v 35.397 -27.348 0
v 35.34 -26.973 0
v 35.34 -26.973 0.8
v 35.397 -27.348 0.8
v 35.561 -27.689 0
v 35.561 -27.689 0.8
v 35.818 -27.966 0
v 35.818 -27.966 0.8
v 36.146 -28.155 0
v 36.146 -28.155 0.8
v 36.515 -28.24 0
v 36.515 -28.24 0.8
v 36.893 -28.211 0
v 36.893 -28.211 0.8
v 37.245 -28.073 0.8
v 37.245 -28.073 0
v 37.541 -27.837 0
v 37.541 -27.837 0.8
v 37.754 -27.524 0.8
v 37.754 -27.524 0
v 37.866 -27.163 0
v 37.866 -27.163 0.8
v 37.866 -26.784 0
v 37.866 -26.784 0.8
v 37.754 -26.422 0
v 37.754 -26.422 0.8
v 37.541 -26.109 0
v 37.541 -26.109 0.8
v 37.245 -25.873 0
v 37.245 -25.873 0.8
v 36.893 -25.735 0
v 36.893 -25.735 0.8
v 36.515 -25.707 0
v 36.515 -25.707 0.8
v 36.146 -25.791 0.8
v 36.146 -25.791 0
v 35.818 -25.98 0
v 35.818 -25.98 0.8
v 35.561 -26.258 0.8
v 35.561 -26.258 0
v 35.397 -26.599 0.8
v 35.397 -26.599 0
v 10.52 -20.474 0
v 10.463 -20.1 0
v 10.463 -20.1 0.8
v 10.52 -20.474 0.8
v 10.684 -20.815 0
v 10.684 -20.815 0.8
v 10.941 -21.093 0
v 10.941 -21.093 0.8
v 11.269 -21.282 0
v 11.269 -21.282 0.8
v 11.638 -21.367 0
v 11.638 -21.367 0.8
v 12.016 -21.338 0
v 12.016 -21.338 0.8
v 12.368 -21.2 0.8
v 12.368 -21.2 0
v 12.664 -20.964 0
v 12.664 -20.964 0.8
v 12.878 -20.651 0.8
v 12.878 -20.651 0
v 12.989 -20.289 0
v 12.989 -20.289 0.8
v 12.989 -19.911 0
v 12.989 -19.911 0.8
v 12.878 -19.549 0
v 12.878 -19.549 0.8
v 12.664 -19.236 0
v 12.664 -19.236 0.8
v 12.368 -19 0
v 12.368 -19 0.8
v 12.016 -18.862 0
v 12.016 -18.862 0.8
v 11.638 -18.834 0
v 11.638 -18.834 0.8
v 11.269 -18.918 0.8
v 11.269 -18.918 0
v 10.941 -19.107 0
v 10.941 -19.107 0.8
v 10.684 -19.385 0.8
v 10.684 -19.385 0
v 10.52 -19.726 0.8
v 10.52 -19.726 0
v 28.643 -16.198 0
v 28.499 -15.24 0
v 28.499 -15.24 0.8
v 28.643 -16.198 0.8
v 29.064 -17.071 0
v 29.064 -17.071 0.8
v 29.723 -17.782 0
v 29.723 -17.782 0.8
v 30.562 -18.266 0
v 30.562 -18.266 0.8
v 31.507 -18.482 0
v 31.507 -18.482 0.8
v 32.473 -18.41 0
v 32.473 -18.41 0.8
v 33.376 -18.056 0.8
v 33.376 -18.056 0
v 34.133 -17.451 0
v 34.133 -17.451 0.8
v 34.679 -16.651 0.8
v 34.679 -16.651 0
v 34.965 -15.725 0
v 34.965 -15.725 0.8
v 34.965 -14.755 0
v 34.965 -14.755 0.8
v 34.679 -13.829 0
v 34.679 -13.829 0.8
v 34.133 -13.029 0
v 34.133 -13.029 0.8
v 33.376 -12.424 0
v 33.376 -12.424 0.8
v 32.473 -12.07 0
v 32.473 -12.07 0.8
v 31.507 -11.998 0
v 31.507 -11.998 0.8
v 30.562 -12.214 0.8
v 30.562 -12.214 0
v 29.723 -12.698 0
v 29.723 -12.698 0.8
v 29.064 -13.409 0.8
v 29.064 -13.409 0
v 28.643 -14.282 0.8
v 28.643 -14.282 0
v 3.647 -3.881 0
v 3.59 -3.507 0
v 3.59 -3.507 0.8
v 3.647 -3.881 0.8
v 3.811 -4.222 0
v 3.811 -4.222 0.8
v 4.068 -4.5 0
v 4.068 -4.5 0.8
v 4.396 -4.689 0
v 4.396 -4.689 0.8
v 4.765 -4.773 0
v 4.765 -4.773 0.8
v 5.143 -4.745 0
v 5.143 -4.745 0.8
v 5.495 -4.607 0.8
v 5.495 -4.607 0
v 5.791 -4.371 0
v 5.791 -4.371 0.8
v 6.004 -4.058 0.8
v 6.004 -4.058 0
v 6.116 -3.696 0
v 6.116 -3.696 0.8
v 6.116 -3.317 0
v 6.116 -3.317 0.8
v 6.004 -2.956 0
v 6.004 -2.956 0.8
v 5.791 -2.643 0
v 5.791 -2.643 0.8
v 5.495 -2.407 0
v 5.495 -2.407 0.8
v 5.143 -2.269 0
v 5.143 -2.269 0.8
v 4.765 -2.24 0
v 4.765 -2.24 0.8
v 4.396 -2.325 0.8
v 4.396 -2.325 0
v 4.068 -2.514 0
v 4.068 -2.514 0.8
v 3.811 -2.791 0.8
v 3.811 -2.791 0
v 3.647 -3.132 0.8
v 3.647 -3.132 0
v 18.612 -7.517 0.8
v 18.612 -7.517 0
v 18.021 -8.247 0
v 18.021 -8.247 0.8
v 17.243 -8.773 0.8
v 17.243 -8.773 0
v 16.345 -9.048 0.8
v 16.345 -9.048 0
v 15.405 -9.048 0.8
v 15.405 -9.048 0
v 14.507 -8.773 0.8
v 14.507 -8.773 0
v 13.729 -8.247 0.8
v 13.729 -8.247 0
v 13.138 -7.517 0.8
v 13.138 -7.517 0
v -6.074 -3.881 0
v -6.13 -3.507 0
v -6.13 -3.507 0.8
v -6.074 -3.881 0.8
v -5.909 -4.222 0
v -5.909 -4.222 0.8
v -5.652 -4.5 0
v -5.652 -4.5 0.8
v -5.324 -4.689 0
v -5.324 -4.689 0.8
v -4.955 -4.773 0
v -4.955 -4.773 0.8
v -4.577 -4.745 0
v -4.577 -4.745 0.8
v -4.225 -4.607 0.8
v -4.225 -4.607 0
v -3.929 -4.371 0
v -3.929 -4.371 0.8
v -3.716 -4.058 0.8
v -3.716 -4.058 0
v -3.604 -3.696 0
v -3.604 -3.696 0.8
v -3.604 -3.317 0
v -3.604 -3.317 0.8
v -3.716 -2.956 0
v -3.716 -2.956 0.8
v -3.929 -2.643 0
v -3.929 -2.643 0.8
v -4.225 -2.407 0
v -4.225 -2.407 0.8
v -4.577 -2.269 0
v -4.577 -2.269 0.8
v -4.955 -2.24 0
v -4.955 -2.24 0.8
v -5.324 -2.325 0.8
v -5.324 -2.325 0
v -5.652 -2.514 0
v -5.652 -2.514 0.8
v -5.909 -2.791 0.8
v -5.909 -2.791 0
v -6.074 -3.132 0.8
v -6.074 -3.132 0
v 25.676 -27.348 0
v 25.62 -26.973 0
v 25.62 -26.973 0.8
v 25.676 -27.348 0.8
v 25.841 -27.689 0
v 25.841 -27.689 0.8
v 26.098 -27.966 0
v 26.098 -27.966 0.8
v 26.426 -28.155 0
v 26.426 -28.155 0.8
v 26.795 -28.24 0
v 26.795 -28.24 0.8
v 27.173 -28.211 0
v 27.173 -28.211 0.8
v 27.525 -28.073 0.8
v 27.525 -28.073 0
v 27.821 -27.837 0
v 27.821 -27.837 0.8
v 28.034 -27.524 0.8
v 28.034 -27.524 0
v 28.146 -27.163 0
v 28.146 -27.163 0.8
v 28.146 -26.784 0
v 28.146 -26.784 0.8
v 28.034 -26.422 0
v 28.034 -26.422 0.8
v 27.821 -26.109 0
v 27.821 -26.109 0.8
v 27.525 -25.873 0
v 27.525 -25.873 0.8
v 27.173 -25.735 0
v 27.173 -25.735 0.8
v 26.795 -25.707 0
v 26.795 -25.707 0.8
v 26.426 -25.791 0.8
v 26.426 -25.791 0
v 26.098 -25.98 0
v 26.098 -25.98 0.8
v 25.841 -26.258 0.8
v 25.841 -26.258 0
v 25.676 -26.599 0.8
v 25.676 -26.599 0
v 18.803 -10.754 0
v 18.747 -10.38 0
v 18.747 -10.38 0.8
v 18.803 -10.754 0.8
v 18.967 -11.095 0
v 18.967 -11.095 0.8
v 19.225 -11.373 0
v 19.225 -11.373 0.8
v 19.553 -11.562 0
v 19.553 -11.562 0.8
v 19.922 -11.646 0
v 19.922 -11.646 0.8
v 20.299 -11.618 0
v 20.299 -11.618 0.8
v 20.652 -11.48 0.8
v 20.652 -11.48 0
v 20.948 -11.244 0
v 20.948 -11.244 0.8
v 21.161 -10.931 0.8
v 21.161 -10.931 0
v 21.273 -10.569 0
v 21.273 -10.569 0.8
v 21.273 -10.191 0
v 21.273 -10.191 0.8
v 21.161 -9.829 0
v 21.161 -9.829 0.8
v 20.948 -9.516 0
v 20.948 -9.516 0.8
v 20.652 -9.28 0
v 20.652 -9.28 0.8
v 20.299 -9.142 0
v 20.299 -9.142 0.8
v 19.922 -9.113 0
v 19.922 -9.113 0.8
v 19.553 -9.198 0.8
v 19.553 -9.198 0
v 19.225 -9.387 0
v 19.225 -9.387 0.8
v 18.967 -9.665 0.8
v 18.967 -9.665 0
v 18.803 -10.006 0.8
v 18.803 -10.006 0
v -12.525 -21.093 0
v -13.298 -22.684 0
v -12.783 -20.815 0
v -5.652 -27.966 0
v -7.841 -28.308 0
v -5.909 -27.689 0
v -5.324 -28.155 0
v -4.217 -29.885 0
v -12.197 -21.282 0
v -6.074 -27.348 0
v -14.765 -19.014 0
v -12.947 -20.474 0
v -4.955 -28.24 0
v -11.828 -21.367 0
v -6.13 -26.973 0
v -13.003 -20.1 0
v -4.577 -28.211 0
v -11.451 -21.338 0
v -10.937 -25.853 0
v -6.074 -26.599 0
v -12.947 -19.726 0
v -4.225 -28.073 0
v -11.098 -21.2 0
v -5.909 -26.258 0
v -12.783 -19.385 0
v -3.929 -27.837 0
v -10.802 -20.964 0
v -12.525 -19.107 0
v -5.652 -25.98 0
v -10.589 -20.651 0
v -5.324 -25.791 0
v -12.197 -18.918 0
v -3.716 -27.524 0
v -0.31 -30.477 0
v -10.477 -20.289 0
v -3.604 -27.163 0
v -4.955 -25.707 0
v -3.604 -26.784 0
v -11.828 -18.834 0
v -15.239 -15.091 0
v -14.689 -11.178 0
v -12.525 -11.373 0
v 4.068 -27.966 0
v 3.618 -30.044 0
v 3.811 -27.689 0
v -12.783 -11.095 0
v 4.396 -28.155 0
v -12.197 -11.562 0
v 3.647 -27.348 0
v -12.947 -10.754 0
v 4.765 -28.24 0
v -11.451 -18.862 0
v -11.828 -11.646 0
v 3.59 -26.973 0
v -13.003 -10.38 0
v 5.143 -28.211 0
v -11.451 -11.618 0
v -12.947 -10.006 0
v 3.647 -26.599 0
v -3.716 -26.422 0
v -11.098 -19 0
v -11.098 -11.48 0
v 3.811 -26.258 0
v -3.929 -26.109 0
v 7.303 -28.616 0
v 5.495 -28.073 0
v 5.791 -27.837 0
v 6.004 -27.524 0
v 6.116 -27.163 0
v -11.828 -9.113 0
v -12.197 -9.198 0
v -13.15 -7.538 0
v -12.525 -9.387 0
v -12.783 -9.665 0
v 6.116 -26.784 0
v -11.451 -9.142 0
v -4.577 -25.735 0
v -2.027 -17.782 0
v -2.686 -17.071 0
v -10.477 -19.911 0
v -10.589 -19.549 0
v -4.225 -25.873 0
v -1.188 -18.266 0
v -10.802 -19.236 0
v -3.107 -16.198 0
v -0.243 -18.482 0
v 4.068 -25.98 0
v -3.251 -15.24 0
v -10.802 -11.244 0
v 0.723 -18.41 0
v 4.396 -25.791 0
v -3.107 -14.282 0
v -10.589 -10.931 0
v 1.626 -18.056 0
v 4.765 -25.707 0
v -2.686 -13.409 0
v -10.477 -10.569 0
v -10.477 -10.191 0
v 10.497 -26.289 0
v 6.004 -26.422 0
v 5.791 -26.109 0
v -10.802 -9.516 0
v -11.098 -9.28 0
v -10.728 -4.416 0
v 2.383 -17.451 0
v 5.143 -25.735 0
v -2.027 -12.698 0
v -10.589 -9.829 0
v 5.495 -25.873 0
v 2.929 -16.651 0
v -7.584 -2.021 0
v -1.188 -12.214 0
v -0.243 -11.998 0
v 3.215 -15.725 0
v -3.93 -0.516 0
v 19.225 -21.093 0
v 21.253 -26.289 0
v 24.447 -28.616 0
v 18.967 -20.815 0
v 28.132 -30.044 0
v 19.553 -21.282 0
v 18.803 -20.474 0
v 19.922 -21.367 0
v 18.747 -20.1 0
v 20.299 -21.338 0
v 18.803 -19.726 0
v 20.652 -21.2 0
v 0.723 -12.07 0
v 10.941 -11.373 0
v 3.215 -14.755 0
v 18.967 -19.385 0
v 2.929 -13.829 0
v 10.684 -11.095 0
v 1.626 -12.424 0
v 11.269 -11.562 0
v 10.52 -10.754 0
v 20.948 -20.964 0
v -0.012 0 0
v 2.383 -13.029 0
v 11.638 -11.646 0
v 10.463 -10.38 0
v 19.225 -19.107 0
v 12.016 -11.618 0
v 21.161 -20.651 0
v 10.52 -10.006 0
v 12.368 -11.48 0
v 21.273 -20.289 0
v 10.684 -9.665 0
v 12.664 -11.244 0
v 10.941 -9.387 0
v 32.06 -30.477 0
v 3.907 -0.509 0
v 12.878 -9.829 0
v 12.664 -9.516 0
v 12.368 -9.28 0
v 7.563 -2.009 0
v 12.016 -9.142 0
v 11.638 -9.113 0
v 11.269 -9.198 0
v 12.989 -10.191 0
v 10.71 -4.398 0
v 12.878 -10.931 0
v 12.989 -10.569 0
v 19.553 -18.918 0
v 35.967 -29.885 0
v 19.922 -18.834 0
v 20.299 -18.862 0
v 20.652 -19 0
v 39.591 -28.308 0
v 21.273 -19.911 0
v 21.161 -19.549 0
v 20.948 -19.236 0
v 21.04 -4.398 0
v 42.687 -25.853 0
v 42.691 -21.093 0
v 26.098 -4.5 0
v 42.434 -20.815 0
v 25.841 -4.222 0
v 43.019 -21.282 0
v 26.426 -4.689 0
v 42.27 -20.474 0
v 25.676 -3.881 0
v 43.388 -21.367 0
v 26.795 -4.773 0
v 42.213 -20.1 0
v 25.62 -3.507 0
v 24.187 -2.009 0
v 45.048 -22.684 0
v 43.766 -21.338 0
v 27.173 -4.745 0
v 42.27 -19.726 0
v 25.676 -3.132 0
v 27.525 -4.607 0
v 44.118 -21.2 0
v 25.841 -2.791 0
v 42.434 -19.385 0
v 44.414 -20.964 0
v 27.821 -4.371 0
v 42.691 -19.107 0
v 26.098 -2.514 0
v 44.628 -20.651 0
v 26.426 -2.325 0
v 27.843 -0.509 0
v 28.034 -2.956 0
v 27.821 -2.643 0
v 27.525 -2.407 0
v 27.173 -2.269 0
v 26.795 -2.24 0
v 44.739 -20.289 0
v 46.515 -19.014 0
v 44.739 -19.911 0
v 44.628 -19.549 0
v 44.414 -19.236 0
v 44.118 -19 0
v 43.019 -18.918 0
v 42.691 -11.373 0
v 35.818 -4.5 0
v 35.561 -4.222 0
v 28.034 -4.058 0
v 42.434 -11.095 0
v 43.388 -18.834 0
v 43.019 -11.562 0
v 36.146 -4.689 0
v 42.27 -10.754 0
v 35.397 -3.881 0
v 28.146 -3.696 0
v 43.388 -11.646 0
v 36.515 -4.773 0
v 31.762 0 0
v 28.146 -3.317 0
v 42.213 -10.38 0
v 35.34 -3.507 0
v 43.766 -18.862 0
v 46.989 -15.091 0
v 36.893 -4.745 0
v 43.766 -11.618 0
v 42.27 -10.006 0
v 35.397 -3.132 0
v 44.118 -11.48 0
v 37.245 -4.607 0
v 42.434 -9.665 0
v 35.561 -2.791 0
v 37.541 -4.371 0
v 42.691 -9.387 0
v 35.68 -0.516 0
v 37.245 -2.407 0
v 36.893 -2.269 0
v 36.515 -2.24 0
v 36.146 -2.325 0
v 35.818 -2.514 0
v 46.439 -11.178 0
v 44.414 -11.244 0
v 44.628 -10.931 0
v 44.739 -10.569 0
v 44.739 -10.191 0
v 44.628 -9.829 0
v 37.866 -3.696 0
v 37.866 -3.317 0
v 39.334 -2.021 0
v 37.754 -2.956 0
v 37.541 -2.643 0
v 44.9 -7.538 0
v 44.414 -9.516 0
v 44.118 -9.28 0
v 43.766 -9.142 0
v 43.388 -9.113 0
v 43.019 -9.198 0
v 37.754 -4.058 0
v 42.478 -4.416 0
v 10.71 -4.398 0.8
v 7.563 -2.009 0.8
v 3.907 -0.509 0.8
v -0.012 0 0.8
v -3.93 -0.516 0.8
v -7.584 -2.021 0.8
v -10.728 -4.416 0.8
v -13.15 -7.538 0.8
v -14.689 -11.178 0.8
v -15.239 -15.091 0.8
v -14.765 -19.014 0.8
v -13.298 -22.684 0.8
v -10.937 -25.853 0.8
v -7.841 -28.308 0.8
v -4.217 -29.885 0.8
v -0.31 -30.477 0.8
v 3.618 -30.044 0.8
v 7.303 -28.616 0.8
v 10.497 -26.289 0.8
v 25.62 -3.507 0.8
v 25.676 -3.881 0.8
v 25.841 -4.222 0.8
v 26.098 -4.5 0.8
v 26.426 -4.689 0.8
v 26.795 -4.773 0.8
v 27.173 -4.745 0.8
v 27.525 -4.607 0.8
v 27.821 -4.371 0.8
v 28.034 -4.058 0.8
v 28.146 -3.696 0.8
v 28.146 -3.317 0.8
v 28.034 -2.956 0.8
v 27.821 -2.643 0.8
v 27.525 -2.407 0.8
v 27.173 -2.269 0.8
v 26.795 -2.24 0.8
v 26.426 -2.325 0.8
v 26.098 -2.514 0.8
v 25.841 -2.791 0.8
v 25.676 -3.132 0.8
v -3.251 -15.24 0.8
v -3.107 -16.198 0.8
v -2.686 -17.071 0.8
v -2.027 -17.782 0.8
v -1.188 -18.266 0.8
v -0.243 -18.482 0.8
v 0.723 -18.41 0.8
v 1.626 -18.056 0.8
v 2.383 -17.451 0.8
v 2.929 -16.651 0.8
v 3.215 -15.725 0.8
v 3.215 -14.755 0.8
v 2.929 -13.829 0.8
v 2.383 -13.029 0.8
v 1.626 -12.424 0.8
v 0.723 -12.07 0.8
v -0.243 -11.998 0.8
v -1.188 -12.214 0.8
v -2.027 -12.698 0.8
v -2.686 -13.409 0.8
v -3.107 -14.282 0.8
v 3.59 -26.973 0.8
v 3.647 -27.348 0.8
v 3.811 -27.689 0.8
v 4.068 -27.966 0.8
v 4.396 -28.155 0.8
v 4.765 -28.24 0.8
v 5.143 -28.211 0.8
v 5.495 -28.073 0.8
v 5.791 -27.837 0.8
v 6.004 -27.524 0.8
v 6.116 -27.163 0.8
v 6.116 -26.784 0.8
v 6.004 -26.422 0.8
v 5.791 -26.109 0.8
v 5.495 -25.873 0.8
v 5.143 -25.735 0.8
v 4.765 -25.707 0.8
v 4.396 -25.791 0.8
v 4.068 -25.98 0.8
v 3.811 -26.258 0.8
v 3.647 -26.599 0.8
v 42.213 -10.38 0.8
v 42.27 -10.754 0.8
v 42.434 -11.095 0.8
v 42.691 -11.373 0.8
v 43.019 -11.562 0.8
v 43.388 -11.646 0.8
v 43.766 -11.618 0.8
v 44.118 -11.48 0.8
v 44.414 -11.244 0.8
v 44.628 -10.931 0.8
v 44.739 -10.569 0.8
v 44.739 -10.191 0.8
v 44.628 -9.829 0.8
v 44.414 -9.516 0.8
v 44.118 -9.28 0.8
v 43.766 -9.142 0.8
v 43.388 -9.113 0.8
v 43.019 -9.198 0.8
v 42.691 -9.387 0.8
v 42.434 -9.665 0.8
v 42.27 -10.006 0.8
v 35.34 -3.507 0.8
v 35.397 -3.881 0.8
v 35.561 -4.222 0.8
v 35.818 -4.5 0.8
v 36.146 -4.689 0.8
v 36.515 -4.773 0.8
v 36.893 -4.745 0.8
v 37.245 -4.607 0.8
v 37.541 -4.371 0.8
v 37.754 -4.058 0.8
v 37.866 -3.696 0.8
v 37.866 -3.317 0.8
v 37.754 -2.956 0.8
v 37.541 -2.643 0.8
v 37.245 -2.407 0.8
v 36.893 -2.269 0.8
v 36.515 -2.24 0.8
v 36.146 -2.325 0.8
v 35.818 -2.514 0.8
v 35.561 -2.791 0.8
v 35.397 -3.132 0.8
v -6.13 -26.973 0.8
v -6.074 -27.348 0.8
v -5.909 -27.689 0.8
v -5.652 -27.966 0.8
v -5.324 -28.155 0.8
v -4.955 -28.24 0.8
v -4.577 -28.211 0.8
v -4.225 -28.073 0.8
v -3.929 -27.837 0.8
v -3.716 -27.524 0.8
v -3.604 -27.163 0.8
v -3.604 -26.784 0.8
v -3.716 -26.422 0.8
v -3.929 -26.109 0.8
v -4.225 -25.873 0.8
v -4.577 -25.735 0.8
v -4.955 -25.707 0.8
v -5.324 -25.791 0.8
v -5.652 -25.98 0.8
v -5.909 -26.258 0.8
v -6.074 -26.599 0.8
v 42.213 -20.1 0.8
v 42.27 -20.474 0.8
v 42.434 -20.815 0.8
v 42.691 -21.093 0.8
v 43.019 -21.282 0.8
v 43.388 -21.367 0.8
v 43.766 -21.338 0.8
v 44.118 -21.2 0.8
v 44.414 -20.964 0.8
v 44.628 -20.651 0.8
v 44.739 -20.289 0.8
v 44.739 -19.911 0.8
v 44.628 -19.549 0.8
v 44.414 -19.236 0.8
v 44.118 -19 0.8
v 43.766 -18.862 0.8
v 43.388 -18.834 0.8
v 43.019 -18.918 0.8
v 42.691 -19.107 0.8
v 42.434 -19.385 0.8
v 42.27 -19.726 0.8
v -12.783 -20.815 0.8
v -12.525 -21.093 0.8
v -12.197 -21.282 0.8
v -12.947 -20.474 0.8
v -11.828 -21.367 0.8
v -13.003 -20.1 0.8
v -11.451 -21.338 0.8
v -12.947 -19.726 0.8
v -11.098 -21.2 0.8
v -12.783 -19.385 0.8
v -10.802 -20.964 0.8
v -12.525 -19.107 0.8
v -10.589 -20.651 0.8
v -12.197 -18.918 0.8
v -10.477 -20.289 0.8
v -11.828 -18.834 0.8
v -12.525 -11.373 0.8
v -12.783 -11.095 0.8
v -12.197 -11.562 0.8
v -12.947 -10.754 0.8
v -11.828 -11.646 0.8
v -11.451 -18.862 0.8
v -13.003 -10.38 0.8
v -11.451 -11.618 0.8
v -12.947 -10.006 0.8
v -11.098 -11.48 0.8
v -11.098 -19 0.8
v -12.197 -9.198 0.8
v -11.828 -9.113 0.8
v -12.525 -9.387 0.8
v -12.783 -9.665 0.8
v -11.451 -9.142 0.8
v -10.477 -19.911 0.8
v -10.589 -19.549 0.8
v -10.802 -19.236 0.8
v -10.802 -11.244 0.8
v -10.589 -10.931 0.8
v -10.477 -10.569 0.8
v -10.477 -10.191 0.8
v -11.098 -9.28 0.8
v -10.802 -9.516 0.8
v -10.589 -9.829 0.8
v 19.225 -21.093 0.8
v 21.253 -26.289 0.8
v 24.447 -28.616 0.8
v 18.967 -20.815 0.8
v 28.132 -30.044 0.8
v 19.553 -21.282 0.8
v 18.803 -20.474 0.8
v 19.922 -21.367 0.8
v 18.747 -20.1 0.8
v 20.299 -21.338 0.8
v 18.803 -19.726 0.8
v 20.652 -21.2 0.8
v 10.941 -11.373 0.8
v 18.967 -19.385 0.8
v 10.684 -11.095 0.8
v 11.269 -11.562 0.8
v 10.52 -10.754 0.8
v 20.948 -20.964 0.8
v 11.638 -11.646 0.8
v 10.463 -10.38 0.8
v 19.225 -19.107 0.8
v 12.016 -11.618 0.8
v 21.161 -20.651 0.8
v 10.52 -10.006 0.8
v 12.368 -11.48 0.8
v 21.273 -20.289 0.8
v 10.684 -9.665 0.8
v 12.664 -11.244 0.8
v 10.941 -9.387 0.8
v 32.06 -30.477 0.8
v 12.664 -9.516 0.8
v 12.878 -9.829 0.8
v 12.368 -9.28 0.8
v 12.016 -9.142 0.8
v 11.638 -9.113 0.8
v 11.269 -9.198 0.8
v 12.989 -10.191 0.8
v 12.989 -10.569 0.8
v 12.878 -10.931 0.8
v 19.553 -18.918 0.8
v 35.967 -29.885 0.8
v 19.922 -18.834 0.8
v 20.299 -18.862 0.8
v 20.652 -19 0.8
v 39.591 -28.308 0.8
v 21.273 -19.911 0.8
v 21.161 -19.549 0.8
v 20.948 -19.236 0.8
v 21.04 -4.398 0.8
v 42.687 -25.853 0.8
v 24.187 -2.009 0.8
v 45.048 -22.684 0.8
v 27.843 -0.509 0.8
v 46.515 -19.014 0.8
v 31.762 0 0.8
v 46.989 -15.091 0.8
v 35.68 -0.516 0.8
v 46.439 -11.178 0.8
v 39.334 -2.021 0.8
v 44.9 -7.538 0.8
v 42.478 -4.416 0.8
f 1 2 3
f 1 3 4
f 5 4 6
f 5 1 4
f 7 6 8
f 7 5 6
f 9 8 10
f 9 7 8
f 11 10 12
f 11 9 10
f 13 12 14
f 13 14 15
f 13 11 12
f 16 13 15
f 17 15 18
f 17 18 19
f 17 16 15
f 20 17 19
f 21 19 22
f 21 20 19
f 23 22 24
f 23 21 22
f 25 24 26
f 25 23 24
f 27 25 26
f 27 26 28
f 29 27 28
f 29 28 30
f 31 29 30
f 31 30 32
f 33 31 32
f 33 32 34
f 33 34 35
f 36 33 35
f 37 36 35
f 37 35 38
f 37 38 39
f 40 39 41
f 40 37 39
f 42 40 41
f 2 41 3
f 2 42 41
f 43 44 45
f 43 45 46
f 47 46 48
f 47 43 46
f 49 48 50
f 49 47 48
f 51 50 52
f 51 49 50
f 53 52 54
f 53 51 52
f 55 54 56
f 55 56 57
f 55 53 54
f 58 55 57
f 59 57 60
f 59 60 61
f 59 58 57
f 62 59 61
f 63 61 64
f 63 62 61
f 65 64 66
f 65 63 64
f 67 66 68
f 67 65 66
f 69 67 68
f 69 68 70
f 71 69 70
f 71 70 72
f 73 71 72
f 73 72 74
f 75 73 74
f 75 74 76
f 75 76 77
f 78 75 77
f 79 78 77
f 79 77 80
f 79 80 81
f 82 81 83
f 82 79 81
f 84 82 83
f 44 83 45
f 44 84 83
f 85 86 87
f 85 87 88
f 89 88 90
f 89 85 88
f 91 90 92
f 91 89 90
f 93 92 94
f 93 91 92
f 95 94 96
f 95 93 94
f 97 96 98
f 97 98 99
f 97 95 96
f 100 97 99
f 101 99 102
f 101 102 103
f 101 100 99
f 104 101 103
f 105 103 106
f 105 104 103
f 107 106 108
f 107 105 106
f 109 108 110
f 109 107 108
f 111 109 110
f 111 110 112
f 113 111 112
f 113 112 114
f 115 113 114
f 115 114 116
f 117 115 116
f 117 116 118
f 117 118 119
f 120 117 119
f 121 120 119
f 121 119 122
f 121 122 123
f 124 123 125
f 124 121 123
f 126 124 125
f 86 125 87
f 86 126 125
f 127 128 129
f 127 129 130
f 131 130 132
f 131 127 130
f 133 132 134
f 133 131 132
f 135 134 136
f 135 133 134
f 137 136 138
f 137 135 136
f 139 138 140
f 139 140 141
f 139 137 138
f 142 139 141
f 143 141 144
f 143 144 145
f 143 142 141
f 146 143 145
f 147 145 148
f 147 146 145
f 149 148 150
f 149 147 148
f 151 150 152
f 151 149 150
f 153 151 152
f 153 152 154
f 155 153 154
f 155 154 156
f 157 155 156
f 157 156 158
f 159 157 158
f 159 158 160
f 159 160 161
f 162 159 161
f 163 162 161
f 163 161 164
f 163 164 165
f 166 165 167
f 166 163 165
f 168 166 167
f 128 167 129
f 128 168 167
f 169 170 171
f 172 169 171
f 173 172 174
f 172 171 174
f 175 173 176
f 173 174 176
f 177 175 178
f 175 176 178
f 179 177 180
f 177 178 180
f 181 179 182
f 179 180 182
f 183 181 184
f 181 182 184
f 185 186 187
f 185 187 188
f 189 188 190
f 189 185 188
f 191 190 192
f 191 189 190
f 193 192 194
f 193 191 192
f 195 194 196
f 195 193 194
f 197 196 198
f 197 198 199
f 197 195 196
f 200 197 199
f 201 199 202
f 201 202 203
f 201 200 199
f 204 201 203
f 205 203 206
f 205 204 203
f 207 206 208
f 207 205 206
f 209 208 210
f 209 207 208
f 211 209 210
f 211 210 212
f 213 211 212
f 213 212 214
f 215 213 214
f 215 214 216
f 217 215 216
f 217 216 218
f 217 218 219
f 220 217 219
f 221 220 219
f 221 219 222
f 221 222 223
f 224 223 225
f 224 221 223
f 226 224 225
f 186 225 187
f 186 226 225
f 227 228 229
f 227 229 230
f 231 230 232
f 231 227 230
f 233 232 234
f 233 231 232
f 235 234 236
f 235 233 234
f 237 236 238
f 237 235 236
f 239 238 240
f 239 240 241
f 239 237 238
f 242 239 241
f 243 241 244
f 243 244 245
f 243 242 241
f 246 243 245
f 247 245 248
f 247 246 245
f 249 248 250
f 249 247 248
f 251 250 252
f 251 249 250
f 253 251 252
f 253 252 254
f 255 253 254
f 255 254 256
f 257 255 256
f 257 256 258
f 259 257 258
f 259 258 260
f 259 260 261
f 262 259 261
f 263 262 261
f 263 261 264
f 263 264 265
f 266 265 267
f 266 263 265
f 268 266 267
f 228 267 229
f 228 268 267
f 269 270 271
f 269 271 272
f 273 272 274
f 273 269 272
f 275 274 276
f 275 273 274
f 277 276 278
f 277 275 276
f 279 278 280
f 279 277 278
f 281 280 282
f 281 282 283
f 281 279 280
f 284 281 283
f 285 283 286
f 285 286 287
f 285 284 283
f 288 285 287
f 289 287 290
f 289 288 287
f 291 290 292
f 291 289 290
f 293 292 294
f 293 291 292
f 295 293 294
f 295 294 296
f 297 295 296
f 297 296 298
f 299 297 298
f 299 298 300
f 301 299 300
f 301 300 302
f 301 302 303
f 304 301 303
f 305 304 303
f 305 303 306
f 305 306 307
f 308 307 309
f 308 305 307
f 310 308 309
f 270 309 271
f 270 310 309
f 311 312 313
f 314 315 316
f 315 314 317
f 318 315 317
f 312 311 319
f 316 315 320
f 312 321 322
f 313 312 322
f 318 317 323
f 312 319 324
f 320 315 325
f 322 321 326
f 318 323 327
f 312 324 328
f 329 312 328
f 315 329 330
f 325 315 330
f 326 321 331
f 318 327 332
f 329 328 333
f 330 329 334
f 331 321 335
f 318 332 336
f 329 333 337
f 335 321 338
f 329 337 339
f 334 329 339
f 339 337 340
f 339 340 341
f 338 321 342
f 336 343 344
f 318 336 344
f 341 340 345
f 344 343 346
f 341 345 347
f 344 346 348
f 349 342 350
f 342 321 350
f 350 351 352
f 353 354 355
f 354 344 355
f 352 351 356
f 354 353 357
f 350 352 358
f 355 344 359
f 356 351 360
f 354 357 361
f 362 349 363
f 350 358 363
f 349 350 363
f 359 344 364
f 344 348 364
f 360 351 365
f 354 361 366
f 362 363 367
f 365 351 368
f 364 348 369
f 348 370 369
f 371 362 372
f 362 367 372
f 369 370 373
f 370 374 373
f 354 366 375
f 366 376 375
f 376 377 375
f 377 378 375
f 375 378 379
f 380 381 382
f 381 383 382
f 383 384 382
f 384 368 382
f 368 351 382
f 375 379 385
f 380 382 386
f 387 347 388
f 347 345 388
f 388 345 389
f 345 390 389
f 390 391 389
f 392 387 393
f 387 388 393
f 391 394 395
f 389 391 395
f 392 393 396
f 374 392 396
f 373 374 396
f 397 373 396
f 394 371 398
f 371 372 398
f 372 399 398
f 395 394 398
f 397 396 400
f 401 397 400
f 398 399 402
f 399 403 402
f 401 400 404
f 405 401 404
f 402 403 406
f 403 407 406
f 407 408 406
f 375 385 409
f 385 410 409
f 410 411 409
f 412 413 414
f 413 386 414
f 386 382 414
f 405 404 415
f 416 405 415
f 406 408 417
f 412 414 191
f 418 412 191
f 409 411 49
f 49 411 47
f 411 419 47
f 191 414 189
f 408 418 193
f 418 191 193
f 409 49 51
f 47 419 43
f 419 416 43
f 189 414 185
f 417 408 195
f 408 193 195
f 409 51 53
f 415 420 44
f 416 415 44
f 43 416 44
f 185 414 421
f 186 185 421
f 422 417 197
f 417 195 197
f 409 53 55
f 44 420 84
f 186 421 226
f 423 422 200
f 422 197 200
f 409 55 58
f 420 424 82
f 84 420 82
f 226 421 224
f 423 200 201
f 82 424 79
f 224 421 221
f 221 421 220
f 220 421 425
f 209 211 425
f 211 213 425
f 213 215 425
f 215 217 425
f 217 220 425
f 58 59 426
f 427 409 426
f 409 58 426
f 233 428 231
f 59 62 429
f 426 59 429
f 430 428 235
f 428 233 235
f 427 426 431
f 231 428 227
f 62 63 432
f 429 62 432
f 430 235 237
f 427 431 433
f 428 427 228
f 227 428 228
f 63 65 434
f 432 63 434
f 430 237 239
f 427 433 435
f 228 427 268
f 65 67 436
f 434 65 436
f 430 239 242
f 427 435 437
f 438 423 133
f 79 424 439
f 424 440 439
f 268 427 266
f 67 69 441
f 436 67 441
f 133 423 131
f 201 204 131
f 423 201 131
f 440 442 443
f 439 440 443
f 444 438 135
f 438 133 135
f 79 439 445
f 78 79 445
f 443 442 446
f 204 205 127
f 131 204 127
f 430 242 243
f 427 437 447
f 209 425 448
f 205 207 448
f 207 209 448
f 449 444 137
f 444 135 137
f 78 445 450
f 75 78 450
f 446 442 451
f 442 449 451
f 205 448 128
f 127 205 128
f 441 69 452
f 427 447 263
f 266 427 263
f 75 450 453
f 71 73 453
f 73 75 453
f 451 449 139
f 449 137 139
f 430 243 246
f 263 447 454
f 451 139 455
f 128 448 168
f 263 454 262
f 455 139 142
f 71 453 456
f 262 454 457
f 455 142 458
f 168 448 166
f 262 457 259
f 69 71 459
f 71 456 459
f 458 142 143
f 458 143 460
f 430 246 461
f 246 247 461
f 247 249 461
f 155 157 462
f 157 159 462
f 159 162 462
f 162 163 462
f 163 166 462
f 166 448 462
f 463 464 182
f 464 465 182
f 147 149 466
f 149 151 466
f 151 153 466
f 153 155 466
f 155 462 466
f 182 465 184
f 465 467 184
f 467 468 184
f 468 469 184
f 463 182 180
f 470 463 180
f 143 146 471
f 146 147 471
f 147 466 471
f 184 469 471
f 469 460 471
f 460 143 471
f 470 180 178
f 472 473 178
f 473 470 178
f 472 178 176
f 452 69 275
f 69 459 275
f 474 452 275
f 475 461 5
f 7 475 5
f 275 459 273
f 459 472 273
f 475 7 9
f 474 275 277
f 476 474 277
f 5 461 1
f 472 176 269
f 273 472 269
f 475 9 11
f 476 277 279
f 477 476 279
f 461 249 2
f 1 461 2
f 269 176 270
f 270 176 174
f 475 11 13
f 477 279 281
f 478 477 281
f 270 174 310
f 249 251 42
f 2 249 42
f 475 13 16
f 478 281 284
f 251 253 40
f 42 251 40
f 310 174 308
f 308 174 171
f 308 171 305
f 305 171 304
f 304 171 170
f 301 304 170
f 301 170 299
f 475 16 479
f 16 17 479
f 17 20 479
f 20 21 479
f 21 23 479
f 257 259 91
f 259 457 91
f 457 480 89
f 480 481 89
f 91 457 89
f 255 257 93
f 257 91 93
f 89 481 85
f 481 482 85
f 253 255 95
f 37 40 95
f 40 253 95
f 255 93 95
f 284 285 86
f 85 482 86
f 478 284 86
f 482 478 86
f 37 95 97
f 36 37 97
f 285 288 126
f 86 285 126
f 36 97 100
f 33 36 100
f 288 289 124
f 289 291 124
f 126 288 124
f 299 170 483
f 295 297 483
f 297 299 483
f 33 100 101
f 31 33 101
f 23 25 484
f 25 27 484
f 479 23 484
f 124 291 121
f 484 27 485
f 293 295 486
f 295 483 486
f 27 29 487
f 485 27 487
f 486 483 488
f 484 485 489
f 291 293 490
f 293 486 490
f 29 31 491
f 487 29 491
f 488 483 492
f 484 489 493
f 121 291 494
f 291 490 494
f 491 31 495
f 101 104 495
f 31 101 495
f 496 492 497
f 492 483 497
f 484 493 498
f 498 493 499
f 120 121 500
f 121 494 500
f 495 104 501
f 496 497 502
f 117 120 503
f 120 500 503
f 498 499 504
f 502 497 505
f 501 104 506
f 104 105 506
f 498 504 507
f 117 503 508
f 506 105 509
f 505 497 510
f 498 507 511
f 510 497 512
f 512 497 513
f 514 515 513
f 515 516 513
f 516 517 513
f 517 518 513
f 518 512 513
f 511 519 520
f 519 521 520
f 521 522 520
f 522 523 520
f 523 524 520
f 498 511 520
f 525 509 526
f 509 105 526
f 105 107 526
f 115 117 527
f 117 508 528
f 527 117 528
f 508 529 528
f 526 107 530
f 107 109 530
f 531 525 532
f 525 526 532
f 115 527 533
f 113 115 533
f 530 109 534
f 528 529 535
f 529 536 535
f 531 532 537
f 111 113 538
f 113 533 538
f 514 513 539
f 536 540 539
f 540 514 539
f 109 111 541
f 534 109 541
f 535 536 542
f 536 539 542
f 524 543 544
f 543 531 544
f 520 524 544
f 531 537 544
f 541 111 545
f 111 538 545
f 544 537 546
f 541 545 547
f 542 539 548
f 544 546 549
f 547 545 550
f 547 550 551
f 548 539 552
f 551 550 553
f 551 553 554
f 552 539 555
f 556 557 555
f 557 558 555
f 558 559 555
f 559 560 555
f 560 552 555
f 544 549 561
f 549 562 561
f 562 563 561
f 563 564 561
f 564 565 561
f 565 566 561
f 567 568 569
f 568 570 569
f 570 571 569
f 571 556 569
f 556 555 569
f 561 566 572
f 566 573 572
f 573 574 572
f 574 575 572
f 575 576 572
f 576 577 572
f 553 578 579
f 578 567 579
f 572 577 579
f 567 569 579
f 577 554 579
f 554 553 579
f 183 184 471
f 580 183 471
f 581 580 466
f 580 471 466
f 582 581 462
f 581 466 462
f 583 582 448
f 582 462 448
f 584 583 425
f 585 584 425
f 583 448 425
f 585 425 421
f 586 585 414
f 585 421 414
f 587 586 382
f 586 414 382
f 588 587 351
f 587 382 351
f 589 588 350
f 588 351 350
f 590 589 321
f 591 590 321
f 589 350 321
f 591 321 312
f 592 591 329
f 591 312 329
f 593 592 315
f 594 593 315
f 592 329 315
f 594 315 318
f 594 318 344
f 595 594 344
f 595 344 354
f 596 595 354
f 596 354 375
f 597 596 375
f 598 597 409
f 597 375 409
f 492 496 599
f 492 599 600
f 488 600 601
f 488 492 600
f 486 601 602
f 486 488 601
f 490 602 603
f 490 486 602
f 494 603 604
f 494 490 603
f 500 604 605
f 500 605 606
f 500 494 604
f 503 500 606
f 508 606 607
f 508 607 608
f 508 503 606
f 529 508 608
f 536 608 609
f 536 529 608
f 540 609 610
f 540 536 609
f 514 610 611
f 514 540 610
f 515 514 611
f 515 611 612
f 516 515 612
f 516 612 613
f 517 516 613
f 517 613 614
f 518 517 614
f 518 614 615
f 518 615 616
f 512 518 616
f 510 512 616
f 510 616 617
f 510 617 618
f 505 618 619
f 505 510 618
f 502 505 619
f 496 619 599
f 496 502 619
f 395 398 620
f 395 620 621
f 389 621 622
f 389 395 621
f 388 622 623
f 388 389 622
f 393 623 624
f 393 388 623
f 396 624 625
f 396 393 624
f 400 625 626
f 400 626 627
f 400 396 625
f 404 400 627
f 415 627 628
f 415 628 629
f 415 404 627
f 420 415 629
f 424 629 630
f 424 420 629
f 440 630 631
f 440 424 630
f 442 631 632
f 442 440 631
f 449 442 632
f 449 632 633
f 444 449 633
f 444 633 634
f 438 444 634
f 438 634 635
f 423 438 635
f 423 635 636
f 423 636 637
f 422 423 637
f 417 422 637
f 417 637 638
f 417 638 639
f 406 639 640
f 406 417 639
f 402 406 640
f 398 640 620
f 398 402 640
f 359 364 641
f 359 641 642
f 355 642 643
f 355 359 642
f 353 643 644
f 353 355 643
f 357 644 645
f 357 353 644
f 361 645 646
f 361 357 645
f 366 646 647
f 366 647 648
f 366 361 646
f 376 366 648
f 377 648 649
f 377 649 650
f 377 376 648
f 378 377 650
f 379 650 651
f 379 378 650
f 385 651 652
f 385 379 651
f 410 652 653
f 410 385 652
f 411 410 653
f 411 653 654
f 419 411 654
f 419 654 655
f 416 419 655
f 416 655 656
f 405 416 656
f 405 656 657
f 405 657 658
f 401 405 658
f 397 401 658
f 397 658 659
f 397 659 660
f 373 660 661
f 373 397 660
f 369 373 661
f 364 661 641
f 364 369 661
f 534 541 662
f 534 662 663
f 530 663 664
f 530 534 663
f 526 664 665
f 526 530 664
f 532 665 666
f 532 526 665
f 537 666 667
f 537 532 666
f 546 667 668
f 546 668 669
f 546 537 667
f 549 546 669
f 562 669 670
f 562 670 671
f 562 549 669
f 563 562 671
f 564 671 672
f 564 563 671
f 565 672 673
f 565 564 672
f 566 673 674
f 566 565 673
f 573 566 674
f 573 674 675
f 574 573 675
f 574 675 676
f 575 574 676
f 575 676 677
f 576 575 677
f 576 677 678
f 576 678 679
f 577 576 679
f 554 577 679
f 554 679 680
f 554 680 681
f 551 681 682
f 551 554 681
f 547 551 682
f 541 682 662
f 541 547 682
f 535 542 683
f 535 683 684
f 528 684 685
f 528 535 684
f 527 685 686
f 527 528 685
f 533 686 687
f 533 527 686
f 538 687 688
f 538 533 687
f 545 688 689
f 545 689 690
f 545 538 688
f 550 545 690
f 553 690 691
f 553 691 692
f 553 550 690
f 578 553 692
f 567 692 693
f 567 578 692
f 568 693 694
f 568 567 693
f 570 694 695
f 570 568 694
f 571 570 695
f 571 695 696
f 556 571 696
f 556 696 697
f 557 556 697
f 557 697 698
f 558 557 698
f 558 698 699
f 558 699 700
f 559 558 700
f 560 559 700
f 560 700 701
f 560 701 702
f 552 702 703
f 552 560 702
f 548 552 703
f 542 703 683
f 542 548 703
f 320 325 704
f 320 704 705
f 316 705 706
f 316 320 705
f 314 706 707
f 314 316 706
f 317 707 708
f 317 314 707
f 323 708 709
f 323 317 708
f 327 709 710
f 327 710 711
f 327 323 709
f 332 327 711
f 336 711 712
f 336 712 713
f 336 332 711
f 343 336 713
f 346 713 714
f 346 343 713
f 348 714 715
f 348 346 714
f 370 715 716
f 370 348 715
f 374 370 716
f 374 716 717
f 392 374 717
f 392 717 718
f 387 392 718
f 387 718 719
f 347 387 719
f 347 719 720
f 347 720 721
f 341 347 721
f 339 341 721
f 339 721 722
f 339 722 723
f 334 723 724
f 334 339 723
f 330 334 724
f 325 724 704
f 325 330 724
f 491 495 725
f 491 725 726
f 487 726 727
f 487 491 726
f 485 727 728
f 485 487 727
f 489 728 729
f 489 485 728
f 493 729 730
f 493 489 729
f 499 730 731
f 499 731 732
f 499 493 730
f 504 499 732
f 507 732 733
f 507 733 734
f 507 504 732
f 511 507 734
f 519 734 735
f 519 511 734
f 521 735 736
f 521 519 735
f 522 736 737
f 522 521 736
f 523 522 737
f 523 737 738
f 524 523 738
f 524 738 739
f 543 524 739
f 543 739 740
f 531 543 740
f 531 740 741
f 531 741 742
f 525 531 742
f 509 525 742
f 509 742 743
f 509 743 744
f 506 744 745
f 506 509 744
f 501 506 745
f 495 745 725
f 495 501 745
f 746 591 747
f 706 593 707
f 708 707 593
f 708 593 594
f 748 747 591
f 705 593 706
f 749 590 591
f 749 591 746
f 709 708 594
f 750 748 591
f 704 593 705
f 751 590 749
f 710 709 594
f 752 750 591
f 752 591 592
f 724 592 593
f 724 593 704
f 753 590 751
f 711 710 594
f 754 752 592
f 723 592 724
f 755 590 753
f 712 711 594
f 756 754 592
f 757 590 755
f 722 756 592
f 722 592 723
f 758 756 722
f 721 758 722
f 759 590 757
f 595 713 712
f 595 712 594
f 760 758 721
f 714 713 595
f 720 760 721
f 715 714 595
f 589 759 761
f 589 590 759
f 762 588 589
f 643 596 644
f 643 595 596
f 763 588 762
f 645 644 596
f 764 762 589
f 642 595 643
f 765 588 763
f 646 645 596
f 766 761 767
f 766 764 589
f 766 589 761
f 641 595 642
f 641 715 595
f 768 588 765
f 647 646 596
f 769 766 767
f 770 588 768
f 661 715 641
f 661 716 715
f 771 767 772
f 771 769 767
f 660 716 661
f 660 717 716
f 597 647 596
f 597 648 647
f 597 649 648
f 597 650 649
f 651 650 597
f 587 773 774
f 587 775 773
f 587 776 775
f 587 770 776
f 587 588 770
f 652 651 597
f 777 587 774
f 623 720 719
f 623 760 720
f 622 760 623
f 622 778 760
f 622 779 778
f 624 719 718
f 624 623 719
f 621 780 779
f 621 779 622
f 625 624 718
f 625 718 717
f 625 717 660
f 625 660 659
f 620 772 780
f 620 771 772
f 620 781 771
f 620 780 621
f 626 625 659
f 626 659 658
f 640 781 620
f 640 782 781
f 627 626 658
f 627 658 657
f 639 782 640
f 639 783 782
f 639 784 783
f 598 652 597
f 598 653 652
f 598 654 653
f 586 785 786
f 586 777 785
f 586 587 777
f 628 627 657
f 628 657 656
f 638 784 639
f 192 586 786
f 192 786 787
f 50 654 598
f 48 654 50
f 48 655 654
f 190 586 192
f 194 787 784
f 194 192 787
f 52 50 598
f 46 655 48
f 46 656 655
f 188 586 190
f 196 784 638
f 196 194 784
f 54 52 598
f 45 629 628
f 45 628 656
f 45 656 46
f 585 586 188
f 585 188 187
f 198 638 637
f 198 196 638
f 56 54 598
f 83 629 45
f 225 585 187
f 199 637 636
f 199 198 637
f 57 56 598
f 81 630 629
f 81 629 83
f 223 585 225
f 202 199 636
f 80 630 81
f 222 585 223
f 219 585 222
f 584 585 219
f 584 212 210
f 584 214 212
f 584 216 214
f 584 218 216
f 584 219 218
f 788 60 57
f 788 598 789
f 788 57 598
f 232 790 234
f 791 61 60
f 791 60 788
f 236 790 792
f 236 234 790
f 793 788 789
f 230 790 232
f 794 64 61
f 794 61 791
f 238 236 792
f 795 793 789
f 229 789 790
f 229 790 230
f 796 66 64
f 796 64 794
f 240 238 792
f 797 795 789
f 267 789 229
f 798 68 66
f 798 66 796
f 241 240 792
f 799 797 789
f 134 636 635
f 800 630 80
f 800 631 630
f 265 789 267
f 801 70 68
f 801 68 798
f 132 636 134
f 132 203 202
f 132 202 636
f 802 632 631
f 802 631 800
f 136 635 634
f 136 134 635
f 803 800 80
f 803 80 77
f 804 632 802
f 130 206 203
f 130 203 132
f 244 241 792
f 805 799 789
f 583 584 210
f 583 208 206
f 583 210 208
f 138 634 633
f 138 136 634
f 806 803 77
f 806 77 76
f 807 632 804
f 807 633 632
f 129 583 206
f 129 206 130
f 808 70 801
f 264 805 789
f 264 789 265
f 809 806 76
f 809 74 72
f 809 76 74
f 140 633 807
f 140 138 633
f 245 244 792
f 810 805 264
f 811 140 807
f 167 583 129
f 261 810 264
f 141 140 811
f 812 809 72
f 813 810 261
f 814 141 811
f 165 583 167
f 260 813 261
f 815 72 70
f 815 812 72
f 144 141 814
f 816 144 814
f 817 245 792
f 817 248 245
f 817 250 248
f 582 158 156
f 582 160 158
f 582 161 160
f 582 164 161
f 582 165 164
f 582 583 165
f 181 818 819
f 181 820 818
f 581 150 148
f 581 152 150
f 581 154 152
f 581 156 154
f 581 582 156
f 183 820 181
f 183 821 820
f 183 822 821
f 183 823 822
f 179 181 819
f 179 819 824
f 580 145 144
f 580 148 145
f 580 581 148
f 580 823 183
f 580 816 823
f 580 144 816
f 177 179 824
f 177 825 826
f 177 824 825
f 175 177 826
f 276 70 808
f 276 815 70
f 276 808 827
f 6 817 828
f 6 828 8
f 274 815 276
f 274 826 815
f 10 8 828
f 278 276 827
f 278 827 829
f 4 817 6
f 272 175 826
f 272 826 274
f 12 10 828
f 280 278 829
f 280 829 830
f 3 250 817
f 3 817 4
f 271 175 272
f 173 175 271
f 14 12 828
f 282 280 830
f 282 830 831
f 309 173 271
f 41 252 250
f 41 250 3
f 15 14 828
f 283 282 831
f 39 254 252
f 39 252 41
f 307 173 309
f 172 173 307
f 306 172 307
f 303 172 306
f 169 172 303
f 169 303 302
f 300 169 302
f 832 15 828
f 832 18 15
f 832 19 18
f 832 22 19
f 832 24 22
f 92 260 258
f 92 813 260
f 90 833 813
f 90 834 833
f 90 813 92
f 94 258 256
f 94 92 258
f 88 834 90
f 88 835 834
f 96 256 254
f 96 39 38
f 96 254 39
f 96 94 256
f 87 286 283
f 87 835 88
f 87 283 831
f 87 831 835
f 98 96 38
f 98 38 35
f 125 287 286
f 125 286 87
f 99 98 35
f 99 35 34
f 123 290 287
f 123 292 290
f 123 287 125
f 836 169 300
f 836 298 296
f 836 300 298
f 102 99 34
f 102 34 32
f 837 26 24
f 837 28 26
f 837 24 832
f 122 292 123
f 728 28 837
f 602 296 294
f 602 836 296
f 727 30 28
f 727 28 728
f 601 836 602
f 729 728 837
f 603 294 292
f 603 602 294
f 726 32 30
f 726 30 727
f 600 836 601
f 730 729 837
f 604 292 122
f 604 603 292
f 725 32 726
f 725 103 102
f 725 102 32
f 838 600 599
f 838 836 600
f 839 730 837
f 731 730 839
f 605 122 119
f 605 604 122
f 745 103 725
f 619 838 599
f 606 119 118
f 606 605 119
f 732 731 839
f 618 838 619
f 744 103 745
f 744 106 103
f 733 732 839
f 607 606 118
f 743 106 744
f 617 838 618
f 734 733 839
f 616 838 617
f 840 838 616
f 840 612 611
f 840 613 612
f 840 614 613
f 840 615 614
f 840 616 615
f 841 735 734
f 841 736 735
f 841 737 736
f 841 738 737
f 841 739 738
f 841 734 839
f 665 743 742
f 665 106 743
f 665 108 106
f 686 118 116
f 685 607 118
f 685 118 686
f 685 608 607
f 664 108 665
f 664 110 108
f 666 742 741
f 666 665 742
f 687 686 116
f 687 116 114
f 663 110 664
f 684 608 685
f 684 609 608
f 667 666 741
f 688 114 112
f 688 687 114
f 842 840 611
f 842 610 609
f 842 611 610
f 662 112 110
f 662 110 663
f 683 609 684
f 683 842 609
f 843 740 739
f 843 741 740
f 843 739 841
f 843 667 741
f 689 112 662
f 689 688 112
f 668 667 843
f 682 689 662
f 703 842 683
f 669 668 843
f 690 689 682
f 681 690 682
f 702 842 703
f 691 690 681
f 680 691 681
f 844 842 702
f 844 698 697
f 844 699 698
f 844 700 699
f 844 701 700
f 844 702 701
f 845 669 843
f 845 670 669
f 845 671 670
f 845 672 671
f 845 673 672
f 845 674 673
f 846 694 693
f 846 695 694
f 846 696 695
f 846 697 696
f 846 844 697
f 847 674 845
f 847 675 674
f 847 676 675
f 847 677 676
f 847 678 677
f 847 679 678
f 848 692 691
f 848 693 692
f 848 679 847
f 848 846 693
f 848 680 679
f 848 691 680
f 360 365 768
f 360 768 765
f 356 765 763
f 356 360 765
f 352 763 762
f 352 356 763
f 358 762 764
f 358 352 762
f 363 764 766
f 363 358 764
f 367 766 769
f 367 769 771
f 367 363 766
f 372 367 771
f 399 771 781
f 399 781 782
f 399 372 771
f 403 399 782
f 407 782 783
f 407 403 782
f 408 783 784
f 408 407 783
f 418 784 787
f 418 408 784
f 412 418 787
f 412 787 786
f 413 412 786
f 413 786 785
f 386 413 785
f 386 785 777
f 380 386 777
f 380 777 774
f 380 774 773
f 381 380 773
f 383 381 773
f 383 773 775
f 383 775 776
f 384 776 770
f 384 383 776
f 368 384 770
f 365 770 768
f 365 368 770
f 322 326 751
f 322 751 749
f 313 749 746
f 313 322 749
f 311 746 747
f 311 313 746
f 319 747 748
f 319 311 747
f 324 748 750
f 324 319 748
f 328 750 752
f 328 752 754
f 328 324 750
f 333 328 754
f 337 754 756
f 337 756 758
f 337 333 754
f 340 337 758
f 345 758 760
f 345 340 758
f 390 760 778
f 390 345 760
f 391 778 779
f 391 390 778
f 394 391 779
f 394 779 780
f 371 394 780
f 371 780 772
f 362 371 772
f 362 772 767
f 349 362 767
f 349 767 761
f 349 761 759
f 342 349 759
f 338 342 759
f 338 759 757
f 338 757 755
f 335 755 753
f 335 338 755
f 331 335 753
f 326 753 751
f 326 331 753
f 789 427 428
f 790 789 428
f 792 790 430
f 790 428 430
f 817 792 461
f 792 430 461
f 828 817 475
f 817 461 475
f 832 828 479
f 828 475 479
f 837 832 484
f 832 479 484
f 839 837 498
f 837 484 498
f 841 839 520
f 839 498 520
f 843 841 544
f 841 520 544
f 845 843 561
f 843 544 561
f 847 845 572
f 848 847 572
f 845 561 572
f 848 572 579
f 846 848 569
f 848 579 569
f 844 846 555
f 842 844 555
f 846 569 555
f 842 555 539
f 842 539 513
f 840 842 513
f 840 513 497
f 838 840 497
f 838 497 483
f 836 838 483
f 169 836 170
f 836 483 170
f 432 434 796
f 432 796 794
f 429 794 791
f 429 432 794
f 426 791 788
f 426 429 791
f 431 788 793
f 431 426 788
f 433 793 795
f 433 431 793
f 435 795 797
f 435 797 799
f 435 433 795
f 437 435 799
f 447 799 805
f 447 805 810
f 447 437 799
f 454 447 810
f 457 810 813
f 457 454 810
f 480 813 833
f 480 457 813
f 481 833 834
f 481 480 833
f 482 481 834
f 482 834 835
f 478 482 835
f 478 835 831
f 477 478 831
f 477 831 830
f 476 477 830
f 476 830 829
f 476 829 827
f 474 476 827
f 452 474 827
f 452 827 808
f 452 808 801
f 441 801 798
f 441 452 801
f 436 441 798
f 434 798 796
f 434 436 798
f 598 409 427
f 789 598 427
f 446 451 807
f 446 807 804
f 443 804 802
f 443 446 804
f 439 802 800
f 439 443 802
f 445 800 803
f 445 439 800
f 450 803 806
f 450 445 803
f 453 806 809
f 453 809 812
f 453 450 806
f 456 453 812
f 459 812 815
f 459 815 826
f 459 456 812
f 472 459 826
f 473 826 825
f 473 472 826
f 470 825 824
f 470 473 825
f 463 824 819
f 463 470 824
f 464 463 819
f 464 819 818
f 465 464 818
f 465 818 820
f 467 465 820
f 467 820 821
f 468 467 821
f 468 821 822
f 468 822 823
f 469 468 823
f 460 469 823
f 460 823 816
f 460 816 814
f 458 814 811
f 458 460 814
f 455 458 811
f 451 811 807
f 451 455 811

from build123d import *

# Parameters (mm, degrees)
SKETCH1_R           = 3.2512
SKETCH1_R_2         = 1.27
BOSS_EXTRUDE1_DEPTH = 0.800000051


with BuildPart() as part:
    # Sketch1 → Boss-Extrude1 (new body)
    with BuildSketch(Plane.XY):
        with BuildLine():
            ThreePointArc((21.253467287, -26.289), (46.841342124, -13.11656107), (18.612068966, -7.516505446))
            ThreePointArc((18.612068966, -7.516505446), (15.875, -9.08244408), (13.137931034, -7.516505446))
            ThreePointArc((13.137931034, -7.516505446), (-15.091342124, -13.11656107), (10.496532713, -26.289))
            Line((10.496532713, -26.289), (21.253467287, -26.289))
        make_face()
        with Locations(Location((31.75, -15.24, 0), (0, 0, 180))):
            Circle(SKETCH1_R, mode=Mode.SUBTRACT)
        with Locations(Location((0, -15.24, 0), (0, 0, 180))):
            Circle(SKETCH1_R, mode=Mode.SUBTRACT)
        with Locations(Location((-11.733270063, -10.379920409, 0), (0, 0, 180))):
            Circle(SKETCH1_R_2, mode=Mode.SUBTRACT)
        with Locations(Location((11.733270063, -10.379920409, 0), (0, 0, 180))):
            Circle(SKETCH1_R_2, mode=Mode.SUBTRACT)
        with Locations(Location((-4.860079591, -3.506729937, 0), (0, 0, 180))):
            Circle(SKETCH1_R_2, mode=Mode.SUBTRACT)
        with Locations(Location((4.860079591, -3.506729937, 0), (0, 0, 180))):
            Circle(SKETCH1_R_2, mode=Mode.SUBTRACT)
        with Locations(Location((20.016729937, -10.379920409, 0), (0, 0, 180))):
            Circle(SKETCH1_R_2, mode=Mode.SUBTRACT)
        with Locations(Location((43.483270063, -10.379920409, 0), (0, 0, 180))):
            Circle(SKETCH1_R_2, mode=Mode.SUBTRACT)
        with Locations(Location((26.889920409, -3.506729937, 0), (0, 0, 180))):
            Circle(SKETCH1_R_2, mode=Mode.SUBTRACT)
        with Locations(Location((36.610079591, -3.506729937, 0), (0, 0, 180))):
            Circle(SKETCH1_R_2, mode=Mode.SUBTRACT)
        with Locations(Location((36.610079591, -26.973270063, 0), (0, 0, 180))):
            Circle(SKETCH1_R_2, mode=Mode.SUBTRACT)
        with Locations(Location((20.016729937, -20.100079591, 0), (0, 0, 180))):
            Circle(SKETCH1_R_2, mode=Mode.SUBTRACT)
        with Locations(Location((43.483270063, -20.100079591, 0), (0, 0, 180))):
            Circle(SKETCH1_R_2, mode=Mode.SUBTRACT)
        with Locations(Location((-4.860079591, -26.973270063, 0), (0, 0, 180))):
            Circle(SKETCH1_R_2, mode=Mode.SUBTRACT)
        with Locations(Location((4.860079591, -26.973270063, 0), (0, 0, 180))):
            Circle(SKETCH1_R_2, mode=Mode.SUBTRACT)
        with Locations(Location((-11.733270063, -20.100079591, 0), (0, 0, 180))):
            Circle(SKETCH1_R_2, mode=Mode.SUBTRACT)
        with Locations(Location((11.733270063, -20.100079591, 0), (0, 0, 180))):
            Circle(SKETCH1_R_2, mode=Mode.SUBTRACT)
        with Locations(Location((26.889920409, -26.973270063, 0), (0, 0, 180))):
            Circle(SKETCH1_R_2, mode=Mode.SUBTRACT)
    extrude(amount=BOSS_EXTRUDE1_DEPTH)


solid = part.part
